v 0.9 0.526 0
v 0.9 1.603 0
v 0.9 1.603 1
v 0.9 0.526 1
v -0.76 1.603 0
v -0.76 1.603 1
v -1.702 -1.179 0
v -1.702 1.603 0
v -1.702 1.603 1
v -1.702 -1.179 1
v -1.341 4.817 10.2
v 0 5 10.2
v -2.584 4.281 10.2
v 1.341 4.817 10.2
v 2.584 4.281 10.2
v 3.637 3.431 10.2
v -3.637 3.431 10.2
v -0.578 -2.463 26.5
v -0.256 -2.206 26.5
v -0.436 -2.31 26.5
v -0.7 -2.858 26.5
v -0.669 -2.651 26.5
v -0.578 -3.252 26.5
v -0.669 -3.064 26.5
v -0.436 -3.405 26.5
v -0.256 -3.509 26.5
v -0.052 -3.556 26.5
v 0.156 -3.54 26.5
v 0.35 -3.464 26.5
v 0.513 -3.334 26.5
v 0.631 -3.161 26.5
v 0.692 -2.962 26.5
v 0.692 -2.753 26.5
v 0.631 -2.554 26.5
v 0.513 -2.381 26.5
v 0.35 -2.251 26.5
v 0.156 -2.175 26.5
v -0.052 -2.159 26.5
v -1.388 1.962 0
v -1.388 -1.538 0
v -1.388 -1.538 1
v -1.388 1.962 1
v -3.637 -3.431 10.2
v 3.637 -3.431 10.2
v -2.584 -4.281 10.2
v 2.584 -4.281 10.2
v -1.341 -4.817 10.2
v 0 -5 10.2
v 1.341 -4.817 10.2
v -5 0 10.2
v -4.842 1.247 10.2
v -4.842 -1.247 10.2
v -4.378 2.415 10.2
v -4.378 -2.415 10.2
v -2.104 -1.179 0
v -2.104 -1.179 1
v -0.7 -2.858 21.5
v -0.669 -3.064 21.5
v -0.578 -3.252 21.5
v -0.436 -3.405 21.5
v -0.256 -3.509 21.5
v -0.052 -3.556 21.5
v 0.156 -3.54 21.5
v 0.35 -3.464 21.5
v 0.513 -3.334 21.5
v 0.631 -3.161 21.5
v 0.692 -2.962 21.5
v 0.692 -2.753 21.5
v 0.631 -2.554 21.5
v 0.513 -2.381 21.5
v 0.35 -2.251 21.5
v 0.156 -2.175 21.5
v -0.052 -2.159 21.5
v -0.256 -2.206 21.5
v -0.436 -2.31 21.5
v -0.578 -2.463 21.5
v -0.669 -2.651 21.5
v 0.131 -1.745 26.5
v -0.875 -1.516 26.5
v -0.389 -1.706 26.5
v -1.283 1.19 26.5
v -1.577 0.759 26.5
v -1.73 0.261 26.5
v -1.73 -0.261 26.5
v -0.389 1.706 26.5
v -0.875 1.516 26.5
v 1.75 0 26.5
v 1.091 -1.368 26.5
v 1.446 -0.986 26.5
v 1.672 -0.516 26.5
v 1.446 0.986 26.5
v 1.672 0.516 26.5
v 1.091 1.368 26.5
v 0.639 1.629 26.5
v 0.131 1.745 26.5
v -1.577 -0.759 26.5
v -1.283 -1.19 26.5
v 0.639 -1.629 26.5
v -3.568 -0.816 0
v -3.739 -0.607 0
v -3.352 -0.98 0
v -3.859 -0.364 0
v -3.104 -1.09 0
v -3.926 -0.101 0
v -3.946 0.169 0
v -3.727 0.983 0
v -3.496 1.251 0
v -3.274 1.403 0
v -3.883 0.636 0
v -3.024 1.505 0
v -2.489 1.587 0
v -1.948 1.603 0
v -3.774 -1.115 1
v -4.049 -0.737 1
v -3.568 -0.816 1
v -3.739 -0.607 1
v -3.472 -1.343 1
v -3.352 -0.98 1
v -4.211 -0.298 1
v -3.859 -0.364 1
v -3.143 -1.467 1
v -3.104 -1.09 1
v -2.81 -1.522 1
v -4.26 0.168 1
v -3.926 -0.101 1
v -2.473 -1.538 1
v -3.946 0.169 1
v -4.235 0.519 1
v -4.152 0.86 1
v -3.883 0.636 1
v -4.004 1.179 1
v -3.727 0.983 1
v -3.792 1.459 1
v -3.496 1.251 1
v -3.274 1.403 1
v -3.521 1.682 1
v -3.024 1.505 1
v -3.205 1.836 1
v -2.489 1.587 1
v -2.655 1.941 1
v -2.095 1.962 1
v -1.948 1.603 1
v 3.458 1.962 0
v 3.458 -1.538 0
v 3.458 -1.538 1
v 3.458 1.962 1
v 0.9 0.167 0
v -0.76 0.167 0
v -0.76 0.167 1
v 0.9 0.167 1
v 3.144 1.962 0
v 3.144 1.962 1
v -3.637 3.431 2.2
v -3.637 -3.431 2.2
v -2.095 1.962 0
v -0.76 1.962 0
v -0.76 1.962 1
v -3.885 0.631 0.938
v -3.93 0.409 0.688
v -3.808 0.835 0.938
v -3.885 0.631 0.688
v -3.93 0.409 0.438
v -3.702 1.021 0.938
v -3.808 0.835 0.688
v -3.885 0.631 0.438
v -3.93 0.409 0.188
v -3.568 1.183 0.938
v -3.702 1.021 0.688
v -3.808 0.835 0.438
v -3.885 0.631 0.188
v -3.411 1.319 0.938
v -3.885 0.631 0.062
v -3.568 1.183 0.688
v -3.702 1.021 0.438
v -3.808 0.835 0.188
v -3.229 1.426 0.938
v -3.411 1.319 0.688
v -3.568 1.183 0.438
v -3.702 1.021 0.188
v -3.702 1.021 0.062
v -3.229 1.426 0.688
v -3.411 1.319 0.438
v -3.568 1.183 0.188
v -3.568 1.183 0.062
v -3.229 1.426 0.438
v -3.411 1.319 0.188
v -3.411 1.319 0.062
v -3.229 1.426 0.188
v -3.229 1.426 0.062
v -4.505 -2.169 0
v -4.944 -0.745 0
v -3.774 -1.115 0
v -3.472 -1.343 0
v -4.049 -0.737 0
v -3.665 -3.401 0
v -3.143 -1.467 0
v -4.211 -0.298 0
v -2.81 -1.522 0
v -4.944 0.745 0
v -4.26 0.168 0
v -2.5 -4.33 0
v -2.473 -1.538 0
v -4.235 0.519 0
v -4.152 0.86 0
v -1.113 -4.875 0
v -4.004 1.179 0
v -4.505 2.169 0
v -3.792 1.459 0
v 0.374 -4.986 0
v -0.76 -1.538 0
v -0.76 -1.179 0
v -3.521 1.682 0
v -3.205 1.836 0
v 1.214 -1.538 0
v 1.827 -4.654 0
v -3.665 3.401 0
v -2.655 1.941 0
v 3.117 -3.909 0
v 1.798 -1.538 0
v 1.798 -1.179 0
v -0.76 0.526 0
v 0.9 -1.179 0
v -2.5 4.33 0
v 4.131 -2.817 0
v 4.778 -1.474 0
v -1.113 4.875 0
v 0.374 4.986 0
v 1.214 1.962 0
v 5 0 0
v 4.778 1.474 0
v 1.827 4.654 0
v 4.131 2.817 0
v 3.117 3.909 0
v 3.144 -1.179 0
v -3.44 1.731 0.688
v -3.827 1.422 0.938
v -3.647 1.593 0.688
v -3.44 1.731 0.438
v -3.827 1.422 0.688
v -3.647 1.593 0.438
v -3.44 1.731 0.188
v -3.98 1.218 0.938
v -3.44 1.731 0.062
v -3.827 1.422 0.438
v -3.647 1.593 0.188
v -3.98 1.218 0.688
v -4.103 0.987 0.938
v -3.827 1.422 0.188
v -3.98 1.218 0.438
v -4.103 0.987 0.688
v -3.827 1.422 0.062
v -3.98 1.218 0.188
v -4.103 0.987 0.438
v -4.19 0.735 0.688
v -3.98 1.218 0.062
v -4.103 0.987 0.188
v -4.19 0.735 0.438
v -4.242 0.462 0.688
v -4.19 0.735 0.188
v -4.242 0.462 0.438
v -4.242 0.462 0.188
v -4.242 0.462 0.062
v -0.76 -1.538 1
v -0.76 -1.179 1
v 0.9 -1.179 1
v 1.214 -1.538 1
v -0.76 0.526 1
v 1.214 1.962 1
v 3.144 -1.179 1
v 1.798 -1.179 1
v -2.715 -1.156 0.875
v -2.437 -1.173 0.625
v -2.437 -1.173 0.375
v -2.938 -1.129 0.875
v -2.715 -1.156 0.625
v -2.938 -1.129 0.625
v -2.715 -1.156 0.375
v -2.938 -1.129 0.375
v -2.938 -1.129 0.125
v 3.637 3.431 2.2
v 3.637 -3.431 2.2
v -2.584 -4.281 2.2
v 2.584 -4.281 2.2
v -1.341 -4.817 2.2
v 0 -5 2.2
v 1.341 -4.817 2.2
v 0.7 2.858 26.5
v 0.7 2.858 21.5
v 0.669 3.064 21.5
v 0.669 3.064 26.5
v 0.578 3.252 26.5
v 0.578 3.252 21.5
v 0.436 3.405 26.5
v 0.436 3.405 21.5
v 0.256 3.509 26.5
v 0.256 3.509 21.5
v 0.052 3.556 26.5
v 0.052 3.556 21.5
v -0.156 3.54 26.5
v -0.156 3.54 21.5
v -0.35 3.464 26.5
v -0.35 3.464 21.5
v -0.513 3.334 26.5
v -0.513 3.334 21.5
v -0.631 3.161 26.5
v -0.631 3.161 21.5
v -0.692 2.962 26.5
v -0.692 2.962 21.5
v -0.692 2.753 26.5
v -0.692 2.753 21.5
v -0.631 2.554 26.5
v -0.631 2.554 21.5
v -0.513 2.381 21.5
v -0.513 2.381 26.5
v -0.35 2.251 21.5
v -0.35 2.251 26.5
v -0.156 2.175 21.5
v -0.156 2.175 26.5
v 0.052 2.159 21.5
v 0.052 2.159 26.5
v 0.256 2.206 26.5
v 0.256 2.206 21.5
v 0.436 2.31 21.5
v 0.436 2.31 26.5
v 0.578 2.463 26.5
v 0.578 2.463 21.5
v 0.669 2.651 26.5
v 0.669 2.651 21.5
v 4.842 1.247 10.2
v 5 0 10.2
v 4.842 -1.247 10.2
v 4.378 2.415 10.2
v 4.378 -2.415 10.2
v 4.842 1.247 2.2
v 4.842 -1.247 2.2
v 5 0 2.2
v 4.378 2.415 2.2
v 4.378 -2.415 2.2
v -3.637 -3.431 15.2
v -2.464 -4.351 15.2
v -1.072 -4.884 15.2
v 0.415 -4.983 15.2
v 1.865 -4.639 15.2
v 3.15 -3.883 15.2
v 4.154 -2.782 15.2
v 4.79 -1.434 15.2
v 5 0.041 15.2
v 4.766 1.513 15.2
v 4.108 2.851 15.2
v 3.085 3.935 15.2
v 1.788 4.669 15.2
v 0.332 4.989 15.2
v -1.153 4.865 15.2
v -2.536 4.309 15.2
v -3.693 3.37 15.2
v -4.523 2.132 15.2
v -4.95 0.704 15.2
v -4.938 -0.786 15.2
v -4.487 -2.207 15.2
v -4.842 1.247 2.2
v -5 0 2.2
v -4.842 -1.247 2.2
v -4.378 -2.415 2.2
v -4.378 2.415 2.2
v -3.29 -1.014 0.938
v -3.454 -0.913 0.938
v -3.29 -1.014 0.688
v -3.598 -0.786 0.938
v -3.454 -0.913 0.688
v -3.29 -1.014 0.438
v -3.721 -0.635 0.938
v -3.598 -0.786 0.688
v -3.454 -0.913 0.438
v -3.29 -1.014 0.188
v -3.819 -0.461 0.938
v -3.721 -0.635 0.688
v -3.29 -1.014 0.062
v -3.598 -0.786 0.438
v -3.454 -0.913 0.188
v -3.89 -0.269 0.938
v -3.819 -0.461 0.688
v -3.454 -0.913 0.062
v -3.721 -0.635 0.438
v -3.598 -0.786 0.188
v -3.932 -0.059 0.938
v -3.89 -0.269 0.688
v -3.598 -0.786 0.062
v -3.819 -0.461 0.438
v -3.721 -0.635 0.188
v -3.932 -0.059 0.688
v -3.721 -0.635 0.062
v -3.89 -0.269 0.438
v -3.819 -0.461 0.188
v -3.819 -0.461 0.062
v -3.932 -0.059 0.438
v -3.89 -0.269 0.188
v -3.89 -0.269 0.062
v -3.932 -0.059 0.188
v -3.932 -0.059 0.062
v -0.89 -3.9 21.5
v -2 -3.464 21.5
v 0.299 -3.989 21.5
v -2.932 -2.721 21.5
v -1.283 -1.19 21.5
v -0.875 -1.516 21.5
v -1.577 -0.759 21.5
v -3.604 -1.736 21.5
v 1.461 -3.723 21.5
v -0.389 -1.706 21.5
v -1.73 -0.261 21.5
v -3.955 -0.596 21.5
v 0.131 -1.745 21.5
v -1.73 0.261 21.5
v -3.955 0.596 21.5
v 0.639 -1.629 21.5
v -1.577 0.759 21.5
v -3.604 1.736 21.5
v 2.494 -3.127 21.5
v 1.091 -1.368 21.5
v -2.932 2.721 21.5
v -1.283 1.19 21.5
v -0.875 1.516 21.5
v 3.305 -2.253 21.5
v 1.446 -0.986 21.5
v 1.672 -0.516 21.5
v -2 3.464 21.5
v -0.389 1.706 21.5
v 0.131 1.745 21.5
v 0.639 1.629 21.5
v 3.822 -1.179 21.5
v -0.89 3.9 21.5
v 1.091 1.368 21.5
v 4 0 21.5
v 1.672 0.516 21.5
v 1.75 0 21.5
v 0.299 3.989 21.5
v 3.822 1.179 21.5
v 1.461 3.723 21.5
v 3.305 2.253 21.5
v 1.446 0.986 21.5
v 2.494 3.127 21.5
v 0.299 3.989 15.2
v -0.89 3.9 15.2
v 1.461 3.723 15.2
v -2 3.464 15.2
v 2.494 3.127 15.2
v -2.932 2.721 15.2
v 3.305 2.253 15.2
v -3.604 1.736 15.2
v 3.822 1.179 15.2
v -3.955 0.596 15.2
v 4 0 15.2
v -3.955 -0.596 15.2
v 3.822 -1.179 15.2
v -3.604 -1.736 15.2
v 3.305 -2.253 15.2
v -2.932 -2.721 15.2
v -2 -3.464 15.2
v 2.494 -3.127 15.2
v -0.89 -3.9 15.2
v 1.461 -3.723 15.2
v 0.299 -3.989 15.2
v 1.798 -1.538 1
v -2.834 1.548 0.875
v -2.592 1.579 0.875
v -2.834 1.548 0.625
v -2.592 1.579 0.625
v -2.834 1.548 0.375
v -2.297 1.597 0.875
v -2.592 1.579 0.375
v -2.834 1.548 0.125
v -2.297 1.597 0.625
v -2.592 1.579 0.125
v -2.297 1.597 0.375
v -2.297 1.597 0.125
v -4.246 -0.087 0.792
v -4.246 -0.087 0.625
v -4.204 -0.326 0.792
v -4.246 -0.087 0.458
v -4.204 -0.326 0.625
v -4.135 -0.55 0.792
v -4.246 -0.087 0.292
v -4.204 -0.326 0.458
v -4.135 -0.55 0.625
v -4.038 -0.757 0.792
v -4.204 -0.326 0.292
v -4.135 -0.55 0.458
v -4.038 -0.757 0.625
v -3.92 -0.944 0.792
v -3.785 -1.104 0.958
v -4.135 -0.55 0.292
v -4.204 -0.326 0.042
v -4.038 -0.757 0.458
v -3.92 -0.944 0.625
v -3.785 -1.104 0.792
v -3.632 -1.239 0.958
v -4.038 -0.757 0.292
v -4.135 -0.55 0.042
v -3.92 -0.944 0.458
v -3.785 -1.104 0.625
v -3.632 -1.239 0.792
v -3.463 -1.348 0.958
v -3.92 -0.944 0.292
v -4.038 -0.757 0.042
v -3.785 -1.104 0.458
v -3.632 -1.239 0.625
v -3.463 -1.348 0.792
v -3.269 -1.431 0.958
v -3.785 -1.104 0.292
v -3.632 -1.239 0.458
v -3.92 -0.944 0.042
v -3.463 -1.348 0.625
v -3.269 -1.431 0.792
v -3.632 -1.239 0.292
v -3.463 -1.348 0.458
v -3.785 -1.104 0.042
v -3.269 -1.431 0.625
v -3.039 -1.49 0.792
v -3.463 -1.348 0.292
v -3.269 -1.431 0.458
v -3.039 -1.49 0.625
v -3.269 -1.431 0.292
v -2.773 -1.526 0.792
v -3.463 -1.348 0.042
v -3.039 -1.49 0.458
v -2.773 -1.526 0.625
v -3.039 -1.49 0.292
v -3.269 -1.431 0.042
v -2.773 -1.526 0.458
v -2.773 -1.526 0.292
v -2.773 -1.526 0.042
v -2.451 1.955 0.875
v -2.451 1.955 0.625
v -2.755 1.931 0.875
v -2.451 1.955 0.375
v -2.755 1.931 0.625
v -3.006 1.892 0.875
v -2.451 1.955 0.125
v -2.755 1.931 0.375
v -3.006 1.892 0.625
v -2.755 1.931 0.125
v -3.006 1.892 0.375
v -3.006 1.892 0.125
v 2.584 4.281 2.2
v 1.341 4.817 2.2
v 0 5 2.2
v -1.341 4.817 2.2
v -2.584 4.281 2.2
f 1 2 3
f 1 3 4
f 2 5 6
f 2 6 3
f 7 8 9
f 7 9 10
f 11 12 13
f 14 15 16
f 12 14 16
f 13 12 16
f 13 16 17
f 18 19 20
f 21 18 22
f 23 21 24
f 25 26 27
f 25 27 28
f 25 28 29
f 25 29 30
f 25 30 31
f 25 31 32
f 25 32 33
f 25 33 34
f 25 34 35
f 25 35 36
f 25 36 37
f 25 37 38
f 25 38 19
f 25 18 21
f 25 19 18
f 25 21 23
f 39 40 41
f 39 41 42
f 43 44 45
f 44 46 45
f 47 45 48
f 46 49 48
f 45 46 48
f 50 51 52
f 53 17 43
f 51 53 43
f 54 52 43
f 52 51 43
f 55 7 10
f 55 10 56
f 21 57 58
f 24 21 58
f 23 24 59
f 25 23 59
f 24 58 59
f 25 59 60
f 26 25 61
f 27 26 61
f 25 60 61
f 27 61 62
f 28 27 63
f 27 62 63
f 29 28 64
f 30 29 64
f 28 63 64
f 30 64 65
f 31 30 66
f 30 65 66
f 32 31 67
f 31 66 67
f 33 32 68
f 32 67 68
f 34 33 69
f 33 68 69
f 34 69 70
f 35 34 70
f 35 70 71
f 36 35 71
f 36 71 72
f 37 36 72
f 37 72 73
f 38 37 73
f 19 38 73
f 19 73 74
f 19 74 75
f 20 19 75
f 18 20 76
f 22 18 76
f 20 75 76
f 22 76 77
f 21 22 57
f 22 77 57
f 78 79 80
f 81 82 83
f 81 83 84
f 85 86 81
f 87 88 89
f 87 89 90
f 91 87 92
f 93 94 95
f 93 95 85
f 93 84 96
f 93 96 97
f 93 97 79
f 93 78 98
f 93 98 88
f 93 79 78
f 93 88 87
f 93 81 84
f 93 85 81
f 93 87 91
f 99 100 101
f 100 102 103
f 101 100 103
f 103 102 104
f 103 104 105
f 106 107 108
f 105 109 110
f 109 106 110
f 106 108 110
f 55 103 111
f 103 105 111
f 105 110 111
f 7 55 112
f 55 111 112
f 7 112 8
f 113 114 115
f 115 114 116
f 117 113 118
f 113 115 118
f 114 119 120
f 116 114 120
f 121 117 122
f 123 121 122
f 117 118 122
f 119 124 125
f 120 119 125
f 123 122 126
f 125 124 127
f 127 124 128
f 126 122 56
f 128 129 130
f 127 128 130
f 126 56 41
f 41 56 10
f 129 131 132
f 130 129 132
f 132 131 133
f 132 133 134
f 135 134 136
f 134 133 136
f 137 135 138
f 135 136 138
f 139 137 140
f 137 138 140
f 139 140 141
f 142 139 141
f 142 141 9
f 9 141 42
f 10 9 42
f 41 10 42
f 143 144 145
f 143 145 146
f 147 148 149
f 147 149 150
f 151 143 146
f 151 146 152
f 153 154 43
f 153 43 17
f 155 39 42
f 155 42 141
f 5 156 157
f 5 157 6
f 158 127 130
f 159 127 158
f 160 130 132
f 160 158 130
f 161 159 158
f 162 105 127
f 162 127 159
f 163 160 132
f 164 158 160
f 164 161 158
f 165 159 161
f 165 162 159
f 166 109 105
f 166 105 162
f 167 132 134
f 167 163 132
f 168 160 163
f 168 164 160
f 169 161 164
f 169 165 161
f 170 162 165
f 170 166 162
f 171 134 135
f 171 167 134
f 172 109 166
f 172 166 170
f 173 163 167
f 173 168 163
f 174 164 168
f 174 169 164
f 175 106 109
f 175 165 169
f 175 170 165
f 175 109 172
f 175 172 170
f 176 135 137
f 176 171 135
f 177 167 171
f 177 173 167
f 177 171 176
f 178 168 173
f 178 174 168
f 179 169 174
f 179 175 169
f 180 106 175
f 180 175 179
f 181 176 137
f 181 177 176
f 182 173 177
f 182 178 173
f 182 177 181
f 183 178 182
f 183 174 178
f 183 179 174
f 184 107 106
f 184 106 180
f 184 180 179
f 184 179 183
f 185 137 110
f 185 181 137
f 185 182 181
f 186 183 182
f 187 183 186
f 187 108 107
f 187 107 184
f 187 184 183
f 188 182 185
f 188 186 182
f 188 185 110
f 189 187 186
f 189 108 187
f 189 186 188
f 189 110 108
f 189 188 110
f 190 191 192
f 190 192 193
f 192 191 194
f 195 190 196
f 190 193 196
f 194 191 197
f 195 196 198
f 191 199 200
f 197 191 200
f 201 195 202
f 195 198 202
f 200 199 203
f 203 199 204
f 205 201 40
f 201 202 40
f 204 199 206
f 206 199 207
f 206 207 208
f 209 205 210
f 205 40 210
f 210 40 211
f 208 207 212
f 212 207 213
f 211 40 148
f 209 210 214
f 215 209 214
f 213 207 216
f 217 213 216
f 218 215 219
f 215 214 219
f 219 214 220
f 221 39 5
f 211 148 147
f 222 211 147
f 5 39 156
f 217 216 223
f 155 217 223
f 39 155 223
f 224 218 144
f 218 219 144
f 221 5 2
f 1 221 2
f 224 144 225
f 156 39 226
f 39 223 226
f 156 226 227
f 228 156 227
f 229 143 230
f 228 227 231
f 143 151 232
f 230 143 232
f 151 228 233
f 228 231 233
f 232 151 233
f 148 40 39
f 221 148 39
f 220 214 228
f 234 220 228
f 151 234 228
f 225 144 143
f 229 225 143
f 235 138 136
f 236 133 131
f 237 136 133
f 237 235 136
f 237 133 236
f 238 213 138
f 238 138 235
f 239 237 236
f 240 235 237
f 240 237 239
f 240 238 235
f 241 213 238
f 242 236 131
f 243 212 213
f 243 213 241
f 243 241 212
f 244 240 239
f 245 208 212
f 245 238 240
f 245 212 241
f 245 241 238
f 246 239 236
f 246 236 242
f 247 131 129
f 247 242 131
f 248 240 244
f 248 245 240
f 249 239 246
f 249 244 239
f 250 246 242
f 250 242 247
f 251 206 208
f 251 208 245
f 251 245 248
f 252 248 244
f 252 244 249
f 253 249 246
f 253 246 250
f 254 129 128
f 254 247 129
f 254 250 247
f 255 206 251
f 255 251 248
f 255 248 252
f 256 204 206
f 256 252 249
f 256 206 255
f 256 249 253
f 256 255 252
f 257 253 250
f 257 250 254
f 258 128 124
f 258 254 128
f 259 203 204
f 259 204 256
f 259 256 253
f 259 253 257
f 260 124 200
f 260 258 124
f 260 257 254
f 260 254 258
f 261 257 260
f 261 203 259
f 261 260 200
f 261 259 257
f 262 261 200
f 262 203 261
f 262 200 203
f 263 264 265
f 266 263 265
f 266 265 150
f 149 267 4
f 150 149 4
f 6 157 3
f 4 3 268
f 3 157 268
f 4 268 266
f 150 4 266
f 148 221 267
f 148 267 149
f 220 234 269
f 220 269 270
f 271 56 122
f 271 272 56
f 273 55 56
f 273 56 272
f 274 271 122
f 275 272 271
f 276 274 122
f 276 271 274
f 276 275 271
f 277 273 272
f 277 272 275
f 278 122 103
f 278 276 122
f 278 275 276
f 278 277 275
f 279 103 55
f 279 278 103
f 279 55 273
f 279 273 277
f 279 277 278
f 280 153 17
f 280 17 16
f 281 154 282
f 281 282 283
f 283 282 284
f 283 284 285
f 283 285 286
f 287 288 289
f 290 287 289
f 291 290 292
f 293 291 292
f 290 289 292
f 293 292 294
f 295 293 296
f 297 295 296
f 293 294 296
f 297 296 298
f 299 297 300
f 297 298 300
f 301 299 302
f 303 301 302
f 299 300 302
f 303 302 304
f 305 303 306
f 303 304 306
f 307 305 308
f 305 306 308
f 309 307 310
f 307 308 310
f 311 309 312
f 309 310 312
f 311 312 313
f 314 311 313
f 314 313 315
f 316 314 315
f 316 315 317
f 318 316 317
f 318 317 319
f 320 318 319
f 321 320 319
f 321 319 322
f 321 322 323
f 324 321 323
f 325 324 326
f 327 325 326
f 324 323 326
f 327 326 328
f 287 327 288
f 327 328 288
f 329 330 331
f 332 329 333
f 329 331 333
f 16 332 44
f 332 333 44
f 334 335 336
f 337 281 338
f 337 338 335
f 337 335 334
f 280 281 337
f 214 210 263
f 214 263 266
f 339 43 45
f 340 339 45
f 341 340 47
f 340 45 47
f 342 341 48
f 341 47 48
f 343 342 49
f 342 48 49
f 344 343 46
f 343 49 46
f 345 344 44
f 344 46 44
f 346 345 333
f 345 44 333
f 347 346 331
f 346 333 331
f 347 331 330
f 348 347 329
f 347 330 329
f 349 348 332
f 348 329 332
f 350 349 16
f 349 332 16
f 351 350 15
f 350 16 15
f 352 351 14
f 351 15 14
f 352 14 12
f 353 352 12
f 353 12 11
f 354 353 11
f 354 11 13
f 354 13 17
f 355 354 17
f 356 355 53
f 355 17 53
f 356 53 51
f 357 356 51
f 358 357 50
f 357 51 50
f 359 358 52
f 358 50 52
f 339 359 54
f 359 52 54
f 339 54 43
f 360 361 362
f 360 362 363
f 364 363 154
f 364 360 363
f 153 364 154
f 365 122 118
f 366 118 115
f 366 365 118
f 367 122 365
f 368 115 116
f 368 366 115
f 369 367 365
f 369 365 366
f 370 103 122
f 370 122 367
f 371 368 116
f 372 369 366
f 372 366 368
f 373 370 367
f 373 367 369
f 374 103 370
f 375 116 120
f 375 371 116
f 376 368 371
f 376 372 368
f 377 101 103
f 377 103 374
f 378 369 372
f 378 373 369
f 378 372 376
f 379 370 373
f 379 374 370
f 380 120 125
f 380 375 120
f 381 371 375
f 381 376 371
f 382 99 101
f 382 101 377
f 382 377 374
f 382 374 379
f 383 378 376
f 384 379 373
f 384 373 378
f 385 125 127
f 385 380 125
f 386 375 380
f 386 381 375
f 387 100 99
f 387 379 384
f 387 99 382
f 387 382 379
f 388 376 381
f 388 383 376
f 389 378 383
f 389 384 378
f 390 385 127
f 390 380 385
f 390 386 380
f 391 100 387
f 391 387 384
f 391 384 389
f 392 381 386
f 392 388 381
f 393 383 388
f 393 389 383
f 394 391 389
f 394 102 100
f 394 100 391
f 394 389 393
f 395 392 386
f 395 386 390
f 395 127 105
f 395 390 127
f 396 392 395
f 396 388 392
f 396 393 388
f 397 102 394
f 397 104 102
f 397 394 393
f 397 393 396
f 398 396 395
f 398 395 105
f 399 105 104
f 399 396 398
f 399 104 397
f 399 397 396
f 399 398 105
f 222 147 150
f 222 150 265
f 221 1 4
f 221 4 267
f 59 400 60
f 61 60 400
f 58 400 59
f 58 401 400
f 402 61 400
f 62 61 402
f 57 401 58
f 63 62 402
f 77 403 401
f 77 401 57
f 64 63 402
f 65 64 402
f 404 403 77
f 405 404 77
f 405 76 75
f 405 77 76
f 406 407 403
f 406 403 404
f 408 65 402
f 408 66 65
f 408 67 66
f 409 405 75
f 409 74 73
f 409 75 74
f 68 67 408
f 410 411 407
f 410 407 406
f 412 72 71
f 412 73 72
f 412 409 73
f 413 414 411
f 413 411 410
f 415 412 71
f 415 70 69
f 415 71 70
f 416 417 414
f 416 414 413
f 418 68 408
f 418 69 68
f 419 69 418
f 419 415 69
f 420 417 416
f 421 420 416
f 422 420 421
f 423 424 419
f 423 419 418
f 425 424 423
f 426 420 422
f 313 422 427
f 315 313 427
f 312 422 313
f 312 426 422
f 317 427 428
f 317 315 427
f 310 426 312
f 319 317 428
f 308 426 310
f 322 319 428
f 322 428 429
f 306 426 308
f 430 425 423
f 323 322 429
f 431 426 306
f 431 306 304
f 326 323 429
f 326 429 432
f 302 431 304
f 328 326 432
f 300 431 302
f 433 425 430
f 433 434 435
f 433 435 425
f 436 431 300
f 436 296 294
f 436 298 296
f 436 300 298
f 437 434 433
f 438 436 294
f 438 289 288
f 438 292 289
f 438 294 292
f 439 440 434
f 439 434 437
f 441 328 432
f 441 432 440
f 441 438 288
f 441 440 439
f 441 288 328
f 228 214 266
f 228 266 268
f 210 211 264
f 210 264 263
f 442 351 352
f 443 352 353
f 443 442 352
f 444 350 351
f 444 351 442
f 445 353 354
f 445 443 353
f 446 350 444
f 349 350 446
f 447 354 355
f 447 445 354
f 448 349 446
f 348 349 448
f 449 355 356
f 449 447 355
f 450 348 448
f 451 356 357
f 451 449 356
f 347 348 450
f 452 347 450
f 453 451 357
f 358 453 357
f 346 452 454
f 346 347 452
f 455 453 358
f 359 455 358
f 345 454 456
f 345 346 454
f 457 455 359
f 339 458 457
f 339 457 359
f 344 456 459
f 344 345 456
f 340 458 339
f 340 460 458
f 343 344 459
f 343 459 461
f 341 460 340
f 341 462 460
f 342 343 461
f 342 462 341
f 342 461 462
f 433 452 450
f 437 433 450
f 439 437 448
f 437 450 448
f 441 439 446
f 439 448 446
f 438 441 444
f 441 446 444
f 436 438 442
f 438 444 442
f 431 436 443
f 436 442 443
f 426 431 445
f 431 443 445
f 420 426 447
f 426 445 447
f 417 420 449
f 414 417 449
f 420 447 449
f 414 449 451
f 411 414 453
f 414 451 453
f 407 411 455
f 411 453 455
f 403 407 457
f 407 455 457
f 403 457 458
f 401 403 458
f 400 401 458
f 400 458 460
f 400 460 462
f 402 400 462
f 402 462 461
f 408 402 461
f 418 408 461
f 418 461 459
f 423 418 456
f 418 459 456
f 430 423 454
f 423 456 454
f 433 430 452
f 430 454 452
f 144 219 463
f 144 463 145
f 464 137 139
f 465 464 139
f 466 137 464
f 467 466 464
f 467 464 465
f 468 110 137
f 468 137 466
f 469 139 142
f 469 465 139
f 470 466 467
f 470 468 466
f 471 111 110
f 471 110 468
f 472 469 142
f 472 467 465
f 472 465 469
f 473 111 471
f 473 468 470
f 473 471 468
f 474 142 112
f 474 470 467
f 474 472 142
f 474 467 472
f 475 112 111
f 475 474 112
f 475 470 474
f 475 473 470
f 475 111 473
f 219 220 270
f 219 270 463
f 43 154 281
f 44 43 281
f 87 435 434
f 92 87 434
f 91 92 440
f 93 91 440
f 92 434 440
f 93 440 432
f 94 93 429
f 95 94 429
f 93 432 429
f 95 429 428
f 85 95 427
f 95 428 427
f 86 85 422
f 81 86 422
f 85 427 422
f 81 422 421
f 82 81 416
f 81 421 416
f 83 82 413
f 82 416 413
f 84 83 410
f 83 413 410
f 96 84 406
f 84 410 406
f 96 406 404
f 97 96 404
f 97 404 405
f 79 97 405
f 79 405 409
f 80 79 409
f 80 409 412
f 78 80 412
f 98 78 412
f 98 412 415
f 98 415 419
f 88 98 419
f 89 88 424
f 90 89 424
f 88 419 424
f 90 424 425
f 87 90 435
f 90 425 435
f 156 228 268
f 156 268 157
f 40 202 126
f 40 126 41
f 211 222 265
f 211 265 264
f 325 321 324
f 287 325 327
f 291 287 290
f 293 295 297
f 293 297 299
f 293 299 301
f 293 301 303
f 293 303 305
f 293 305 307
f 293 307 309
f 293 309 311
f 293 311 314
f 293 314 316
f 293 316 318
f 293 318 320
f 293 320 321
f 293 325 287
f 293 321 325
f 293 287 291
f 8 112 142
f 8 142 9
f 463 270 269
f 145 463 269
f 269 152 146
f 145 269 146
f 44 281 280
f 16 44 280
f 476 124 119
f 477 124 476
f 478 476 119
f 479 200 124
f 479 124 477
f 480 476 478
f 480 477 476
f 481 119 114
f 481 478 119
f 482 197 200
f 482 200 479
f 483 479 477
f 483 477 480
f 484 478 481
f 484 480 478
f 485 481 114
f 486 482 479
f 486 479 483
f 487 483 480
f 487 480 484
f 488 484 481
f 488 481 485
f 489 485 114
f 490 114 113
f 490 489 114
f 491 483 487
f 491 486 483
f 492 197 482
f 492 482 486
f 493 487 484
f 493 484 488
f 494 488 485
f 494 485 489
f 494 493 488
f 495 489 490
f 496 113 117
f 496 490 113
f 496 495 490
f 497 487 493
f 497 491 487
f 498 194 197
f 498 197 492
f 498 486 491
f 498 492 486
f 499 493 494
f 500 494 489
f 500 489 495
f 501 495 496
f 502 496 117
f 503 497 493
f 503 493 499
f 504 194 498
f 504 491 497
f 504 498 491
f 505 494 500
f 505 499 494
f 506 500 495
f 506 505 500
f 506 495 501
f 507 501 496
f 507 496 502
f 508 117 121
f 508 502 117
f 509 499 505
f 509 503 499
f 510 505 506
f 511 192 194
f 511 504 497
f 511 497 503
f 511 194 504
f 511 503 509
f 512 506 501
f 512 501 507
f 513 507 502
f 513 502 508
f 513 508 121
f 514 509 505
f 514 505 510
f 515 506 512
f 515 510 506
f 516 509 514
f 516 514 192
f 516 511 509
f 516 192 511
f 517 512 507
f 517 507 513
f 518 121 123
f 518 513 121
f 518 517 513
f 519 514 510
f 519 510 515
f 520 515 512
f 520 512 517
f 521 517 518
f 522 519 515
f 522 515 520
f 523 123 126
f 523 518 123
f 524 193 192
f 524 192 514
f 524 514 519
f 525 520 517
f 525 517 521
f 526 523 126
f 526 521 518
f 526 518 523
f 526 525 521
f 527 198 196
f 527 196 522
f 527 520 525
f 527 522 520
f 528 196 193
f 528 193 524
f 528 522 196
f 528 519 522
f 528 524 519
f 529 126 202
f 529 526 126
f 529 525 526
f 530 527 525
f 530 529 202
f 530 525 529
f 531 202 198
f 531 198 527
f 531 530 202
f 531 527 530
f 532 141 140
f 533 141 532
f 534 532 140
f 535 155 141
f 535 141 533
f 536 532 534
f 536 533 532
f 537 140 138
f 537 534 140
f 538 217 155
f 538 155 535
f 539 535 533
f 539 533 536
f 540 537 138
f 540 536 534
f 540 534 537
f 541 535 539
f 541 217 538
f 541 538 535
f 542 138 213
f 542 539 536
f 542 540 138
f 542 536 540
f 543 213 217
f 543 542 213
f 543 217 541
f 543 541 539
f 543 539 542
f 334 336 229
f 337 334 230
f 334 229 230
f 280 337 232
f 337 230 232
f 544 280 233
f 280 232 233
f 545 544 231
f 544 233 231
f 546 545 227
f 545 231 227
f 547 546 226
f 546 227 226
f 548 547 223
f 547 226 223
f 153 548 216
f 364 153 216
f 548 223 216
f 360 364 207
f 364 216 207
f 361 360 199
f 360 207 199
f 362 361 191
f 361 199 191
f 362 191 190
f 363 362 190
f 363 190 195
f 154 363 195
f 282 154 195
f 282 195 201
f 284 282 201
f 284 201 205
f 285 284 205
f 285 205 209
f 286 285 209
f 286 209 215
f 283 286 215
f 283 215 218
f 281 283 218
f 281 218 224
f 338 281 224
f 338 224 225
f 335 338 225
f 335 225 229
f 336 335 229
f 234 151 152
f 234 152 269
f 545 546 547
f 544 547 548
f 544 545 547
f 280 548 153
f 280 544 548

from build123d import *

# Parameters (mm, degrees)
CYLINDER_FACE_R      = 5
BASE_CYLINDER_DEPTH  = 2.2
RECTANGULAR_THING_W  = 7.274105322
RECTANGULAR_THING_H  = 6.86202534
RECTANGULAR_DEPTH    = 8
SKETCH5_R            = 5
F_2ND_CYLINDER_DEPTH = 5
SKETCH6_R            = 4
F_3RD_CYLINDER_DEPTH = 6.3
SKETCH7_R            = 1.75
TOP_CYLINDER_DEPTH   = 5
SKETCH9_R            = 0.7
PRONGS_DEPTH         = 5
CUT_EXTRUDE1_DEPTH   = 1


with BuildPart() as part:
    # Cylinder Face → Base Cylinder (new body)
    with BuildSketch(Plane.XY):
        Circle(CYLINDER_FACE_R)
    extrude(amount=BASE_CYLINDER_DEPTH)

    # rectangular thing → rectangular (add)
    with BuildSketch(Plane.XY.offset(2.2)):
        Rectangle(RECTANGULAR_THING_W, RECTANGULAR_THING_H)
    extrude(amount=RECTANGULAR_DEPTH)

    # Sketch5 → 2nd Cylinder (add)
    with BuildSketch(Plane.XY.offset(10.2)):
        with Locations(Location((0, 0, 0), (0, 0, 223.330253175))):
            Circle(SKETCH5_R)
    extrude(amount=F_2ND_CYLINDER_DEPTH)

    # Sketch6 → 3rd Cylinder (add)
    with BuildSketch(Plane.XY.offset(15.2)):
        Circle(SKETCH6_R)
    extrude(amount=F_3RD_CYLINDER_DEPTH)

    # Sketch7 → Top Cylinder (add)
    with BuildSketch(Plane.XY.offset(21.5)):
        Circle(SKETCH7_R)
    extrude(amount=TOP_CYLINDER_DEPTH)

    # Sketch9 → Prongs? (add)
    with BuildSketch(Plane.XY.offset(21.5)):
        with Locations((0, 2.857502284)):
            Circle(SKETCH9_R)
        with Locations(Location((0, -2.857502284, 0), (0, 0, 180))):
            Circle(SKETCH9_R)
    extrude(amount=PRONGS_DEPTH)

    # Sketch10 → Cut-Extrude1 (cut)
    # profile 1 of 3: a face of its own
    with BuildSketch(Plane(origin=(0, 0, 0), x_dir=(-1, 0, 0), z_dir=(0, 0, -1))):
        Polygon((-3.458075012, 1.962360203), (-3.143972448, 1.962360203), (-3.143972448, -1.178665438), (-1.797818602, -1.178665438), (-1.797818602, -1.537639797), (-3.458075012, -1.537639797), align=None)
    # profile 2 of 3: a face of its own
    with BuildSketch(Plane(origin=(0, 0, 0), x_dir=(-1, 0, 0), z_dir=(0, 0, -1))):
        Polygon((-1.214485269, 1.962360203), (0.759873706, 1.962360203), (0.759873706, 1.603385844), (-0.900382705, 1.603385844), (-0.900382705, 0.526462767), (0.759873706, 0.526462767), (0.759873706, 0.167488408), (-0.900382705, 0.167488408), (-0.900382705, -1.178665438), (0.759873706, -1.178665438), (0.759873706, -1.537639797), (-1.214485269, -1.537639797), align=None)
    # profile 3 of 3: a face of its own
    with BuildSketch(Plane(origin=(0, 0, 0), x_dir=(-1, 0, 0), z_dir=(0, 0, -1))):
        with BuildLine():
            Line((1.388078834, -1.537639797), (1.388078834, 1.962360203))
            Line((1.388078834, 1.962360203), (2.094809603, 1.962360203))
            add(Edge.make_bspline(
                [(2.094809603, 1.962360203), (2.156278591, 1.961917633), (2.275036357, 1.96106259), (2.446648804, 1.955641199), (2.605432567, 1.946050733), (2.750865426, 1.932081207), (2.883346638, 1.914928173), (3.002505246, 1.893427769), (3.108957389, 1.868039598), (3.174426829, 1.846394148), (3.205386526, 1.83615828)],
                knots=[0, 0, 0, 0, 1.314313732, 2.53924729, 3.670748893, 4.714932338, 5.66265055, 6.526160246, 7.303039223, 8, 8, 8, 8], degree=3))
            add(Edge.make_bspline(
                [(3.205386526, 1.83615828), (3.245881265, 1.820727574), (3.325952458, 1.79021608), (3.43995958, 1.732659779), (3.547284943, 1.667446677), (3.648504088, 1.594490814), (3.741304915, 1.511726466), (3.829312811, 1.42266938), (3.908927535, 1.32408104), (3.981835831, 1.218006052), (4.047571491, 1.105694), (4.104710648, 0.987358891), (4.152164642, 0.863601683), (4.191557868, 0.734766535), (4.222604326, 0.600570157), (4.243786258, 0.460856291), (4.257757247, 0.316177102), (4.259161299, 0.218002638), (4.259873706, 0.16818953)],
                knots=[0, 0, 0, 0, 0.984719456, 1.947108742, 2.898477687, 3.838006223, 4.779231079, 5.722358779, 6.681677486, 7.655904652, 8.64651281, 9.637519902, 10.640069247, 11.656948941, 12.698408672, 13.768548281, 14.867775369, 16, 16, 16, 16], degree=3))
            add(Edge.make_bspline(
                [(4.259873706, 0.16818953), (4.259244738, 0.124928291), (4.258005292, 0.039677502), (4.246875976, -0.085963393), (4.230699656, -0.207876965), (4.205655458, -0.325482665), (4.175252945, -0.439810883), (4.136288794, -0.549643127), (4.091653297, -0.655986936), (4.039603419, -0.757404412), (3.982462034, -0.853487784), (3.921140291, -0.944063313), (3.855703595, -1.027838534), (3.785527962, -1.105067146), (3.711520246, -1.175632725), (3.633195915, -1.24012474), (3.550352865, -1.297281295), (3.463362142, -1.349348403), (3.369686013, -1.394768759), (3.267550146, -1.433198769), (3.156518968, -1.465045384), (3.036865011, -1.49161628), (2.908381534, -1.512693582), (2.770942568, -1.526819975), (2.624759278, -1.536372908), (2.524380013, -1.537209301), (2.472714251, -1.537639797)],
                knots=[0, 0, 0, 0, 1.105936401, 2.179363191, 3.223086493, 4.248585256, 5.251745608, 6.245858792, 7.225916811, 8.198733463, 9.158002045, 10.082870192, 10.993790845, 11.873723703, 12.748670949, 13.606408763, 14.465103618, 15.319838547, 16.196477973, 17.123216899, 18.106603292, 19.147568657, 20.255746949, 21.433717677, 22.679120308, 24, 24, 24, 24], degree=3))
            Line((2.472714251, -1.537639797), (1.388078834, -1.537639797))
        make_face()
        with BuildLine():
            Line((1.702181398, -1.178665438), (2.103924186, -1.178665438))
            add(Edge.make_bspline(
                [(2.103924186, -1.178665438), (2.161652557, -1.178417342), (2.272685356, -1.177940162), (2.432343353, -1.173752958), (2.578222749, -1.166911021), (2.710344259, -1.157335943), (2.828633283, -1.144667328), (2.933337033, -1.130542425), (3.024112291, -1.112944974), (3.079041728, -1.096994015), (3.104424988, -1.08962297)],
                knots=[0, 0, 0, 0, 1.375205317, 2.645023457, 3.804390687, 4.853969522, 5.800190428, 6.637939096, 7.370582563, 8, 8, 8, 8], degree=3))
            add(Edge.make_bspline(
                [(3.104424988, -1.08962297), (3.13637335, -1.078371412), (3.199506988, -1.056137039), (3.290388073, -1.015579378), (3.375145078, -0.967537308), (3.455255103, -0.914135034), (3.529581759, -0.853489032), (3.599005875, -0.786918043), (3.663387676, -0.714083268), (3.722061984, -0.635075106), (3.774570288, -0.550385311), (3.820041518, -0.460846477), (3.859893049, -0.367439667), (3.891171642, -0.268730508), (3.915687226, -0.16560145), (3.933051914, -0.058045236), (3.943866638, 0.053918045), (3.945128086, 0.13007017), (3.945771142, 0.168890652)],
                knots=[0, 0, 0, 0, 0.998632004, 1.973411704, 2.929992603, 3.868527914, 4.809262121, 5.754881198, 6.702106254, 7.672490631, 8.653608572, 9.636854334, 10.631411391, 11.644891563, 12.686317036, 13.754757253, 14.855430412, 16, 16, 16, 16], degree=3))
            add(Edge.make_bspline(
                [(3.945771142, 0.168890652), (3.945257854, 0.209824132), (3.944249497, 0.290238316), (3.931575186, 0.408229012), (3.913053631, 0.521709662), (3.886269945, 0.630687857), (3.852139066, 0.73537621), (3.809544424, 0.83519572), (3.760877805, 0.931200589), (3.702974468, 1.021174954), (3.639558875, 1.106268064), (3.569180995, 1.184222979), (3.492958957, 1.255217279), (3.411724107, 1.320356592), (3.323187008, 1.377020268), (3.229433317, 1.427706949), (3.129087646, 1.47072284), (3.05927495, 1.493601703), (3.023795981, 1.505228793)],
                knots=[0, 0, 0, 0, 1.122418816, 2.205001699, 3.251619955, 4.274784885, 5.280384055, 6.268708349, 7.249350384, 8.229342522, 9.199999885, 10.157847722, 11.105861043, 12.055065948, 13.010012805, 13.98527497, 14.976112212, 16, 16, 16, 16], degree=3))
            add(Edge.make_bspline(
                [(3.023795981, 1.505228793), (2.994444835, 1.51334522), (2.932036245, 1.530602973), (2.830196781, 1.549428346), (2.715581631, 1.566032845), (2.58768193, 1.580090884), (2.446643471, 1.590178205), (2.292357783, 1.59774952), (2.124758178, 1.602856152), (2.008575645, 1.60320486), (1.948275148, 1.603385844)],
                knots=[0, 0, 0, 0, 0.674548936, 1.434276114, 2.292660221, 3.240891867, 4.284742987, 5.42552168, 6.663806718, 8, 8, 8, 8], degree=3))
            Line((1.948275148, 1.603385844), (1.702181398, 1.603385844))
            Line((1.702181398, 1.603385844), (1.702181398, -1.178665438))
        make_face(mode=Mode.SUBTRACT)
    extrude(amount=-CUT_EXTRUDE1_DEPTH, mode=Mode.SUBTRACT)


solid = part.part
